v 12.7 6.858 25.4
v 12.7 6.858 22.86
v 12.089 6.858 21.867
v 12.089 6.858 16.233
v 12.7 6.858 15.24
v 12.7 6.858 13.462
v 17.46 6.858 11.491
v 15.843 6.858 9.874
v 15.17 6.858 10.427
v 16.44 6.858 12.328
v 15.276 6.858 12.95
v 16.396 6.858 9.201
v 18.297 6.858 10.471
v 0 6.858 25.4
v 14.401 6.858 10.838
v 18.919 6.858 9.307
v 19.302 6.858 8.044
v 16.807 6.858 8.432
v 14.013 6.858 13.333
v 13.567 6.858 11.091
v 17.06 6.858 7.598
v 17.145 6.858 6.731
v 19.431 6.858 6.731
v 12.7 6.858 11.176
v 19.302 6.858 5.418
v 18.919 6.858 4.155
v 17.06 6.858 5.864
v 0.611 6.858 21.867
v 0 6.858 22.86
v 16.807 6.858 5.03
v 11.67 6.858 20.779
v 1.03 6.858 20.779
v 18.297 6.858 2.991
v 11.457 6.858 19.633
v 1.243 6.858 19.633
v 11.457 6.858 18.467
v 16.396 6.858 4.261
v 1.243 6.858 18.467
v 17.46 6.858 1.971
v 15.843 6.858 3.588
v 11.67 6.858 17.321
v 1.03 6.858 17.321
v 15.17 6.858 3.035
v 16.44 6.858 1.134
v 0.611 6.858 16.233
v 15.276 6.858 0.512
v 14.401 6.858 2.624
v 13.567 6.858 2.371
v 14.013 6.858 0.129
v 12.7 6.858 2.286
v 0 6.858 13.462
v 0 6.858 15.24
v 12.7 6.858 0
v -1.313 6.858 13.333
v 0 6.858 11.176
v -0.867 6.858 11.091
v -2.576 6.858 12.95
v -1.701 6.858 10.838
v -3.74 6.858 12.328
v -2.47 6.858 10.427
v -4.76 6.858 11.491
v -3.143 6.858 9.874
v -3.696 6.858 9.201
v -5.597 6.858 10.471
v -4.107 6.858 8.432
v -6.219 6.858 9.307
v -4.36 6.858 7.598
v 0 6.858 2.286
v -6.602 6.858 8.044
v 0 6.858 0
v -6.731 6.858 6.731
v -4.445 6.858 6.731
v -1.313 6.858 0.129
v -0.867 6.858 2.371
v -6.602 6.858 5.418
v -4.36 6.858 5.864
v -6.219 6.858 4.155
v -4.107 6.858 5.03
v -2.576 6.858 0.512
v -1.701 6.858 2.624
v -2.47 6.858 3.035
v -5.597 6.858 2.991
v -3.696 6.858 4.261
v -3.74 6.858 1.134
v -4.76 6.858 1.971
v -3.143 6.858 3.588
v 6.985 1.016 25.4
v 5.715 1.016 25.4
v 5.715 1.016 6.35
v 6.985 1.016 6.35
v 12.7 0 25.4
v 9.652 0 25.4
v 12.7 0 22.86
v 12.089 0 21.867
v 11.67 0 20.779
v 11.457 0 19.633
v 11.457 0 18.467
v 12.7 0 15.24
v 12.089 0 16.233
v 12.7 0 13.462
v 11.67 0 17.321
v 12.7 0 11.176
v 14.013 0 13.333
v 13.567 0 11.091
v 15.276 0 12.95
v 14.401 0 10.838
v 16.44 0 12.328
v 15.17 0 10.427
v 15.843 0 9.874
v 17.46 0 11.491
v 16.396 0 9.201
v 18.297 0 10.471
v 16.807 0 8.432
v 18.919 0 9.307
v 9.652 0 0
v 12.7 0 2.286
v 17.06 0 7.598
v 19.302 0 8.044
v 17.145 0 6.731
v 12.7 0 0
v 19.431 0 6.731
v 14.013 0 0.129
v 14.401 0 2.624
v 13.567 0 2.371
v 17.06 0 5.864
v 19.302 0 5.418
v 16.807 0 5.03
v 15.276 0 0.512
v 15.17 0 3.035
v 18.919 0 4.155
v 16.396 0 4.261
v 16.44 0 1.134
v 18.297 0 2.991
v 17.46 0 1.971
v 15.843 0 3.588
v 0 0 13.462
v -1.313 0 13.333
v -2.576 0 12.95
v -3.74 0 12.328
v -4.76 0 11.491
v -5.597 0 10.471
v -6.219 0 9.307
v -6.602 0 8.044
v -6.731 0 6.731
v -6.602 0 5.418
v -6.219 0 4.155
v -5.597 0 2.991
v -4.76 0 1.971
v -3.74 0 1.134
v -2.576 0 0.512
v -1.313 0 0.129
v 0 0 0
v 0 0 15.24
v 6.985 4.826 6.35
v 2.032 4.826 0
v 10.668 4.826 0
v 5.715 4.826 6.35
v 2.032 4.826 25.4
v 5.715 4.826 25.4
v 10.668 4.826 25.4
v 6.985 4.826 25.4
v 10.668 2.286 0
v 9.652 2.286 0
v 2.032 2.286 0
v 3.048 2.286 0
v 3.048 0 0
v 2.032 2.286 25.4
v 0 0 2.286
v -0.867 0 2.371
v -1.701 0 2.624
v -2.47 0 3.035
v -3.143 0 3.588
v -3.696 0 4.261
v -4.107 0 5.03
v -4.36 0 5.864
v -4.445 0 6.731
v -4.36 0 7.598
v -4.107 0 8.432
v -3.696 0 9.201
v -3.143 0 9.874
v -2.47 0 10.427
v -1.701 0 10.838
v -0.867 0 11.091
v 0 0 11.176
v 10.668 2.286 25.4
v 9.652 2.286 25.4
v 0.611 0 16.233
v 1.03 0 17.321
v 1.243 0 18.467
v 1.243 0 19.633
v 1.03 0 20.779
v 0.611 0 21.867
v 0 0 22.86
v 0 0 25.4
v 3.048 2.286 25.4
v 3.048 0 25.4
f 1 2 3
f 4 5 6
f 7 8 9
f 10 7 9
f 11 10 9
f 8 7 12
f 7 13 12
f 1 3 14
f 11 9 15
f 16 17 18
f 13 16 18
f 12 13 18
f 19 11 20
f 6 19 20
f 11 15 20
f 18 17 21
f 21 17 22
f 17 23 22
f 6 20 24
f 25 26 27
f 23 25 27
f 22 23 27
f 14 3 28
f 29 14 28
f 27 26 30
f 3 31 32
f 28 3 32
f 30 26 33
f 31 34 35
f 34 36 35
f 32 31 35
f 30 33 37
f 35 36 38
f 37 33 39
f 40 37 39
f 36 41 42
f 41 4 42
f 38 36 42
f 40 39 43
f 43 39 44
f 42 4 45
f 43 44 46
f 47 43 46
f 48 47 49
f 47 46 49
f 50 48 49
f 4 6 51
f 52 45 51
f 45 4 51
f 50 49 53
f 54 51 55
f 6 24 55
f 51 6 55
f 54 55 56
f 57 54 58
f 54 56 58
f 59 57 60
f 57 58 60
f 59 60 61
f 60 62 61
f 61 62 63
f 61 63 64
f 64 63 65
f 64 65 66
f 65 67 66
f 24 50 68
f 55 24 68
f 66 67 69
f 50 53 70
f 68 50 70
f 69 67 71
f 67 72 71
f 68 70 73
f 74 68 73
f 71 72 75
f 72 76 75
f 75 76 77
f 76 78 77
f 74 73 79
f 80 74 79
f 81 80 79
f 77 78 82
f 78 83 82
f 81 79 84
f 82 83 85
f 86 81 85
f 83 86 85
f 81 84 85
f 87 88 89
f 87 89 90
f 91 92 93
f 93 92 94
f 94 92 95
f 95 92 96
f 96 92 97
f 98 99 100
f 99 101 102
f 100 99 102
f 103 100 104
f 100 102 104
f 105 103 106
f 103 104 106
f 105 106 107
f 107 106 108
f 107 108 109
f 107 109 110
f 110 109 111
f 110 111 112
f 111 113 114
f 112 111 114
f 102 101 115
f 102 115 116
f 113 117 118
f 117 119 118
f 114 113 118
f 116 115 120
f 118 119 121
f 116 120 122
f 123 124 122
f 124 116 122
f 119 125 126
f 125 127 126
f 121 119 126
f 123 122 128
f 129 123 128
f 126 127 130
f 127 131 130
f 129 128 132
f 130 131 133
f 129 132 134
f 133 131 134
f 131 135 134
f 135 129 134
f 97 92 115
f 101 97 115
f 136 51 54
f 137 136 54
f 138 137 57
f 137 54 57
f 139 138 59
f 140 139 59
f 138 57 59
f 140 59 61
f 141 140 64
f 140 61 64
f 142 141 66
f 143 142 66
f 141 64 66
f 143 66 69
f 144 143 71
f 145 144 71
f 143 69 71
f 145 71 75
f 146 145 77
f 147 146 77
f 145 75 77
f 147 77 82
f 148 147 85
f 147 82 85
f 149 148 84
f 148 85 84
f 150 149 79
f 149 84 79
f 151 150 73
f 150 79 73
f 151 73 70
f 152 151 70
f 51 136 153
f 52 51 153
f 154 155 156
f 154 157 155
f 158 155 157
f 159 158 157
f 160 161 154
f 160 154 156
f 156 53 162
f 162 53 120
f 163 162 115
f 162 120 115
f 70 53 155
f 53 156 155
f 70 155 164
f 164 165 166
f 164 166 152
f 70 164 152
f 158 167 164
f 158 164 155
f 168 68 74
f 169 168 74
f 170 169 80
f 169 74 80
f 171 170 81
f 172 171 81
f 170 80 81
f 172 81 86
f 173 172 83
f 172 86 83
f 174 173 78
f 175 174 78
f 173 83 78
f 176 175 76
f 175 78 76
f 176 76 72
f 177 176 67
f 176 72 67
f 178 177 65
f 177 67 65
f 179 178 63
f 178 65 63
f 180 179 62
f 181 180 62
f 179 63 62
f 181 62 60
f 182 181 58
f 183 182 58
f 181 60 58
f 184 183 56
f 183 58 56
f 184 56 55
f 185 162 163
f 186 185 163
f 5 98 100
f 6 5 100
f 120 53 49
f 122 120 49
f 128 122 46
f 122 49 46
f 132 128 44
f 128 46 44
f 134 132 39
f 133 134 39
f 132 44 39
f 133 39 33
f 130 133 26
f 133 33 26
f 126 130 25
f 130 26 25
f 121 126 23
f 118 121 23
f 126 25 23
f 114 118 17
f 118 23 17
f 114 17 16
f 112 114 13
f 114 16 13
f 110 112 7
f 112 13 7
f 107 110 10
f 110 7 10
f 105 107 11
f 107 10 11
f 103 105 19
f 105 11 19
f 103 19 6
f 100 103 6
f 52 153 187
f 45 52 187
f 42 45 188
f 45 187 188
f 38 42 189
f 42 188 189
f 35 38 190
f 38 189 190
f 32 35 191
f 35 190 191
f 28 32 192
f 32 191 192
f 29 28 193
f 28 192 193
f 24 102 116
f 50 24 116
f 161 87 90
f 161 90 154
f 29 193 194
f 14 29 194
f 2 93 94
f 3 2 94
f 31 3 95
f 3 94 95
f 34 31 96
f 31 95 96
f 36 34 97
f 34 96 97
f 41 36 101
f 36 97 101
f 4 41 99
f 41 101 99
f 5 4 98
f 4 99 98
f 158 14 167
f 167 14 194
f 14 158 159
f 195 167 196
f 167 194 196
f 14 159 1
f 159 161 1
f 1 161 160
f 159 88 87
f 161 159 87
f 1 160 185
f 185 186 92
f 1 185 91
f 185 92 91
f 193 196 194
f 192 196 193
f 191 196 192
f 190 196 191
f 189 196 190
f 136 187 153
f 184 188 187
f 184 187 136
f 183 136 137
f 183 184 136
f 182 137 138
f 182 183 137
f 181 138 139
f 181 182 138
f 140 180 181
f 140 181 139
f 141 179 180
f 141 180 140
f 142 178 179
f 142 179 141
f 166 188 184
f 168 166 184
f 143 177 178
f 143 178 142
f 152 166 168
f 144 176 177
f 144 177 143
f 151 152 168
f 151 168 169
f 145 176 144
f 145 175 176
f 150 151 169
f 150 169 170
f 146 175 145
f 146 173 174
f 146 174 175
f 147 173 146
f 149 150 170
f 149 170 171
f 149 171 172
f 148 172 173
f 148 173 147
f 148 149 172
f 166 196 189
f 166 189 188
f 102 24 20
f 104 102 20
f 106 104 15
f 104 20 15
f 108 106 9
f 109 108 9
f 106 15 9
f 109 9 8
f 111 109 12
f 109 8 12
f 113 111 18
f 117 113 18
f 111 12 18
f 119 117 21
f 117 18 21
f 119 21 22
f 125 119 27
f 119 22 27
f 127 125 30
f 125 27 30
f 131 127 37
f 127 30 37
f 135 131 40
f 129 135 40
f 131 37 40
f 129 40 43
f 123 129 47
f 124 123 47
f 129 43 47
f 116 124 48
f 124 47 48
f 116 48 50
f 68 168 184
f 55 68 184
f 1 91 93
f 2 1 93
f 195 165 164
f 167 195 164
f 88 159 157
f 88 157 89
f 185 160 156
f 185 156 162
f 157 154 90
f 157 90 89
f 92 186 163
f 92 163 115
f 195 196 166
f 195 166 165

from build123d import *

# Parameters (mm, degrees)
BOSS_EXTRUDE1_DEPTH = 6.858
CUT_EXTRUDE1_DEPTH  = 26.4
BOSS_EXTRUDE2_DEPTH = 6.858
SKETCH6_W           = 1.27
SKETCH6_H           = 3.81
CUT_EXTRUDE2_DEPTH  = 6.35


with BuildPart() as part:
    # Sketch1 → Boss-Extrude1 (new body)
    with BuildSketch(Plane(origin=(0, 0, 0), x_dir=(1, 0, 0), z_dir=(0, 1, 0))):
        with BuildLine():
            Line((0, -22.86), (0, -25.4))
            Line((0, -25.4), (12.7, -25.4))
            Line((12.7, -25.4), (12.7, -22.86))
            ThreePointArc((12.7, -22.86), (11.43, -19.05), (12.7, -15.24))
            Line((12.7, -15.24), (12.7, 0))
            Line((12.7, 0), (0, 0))
            Line((0, 0), (0, -15.24))
            ThreePointArc((0, -15.24), (1.27, -19.05), (0, -22.86))
        make_face()
    extrude(amount=BOSS_EXTRUDE1_DEPTH)

    # Sketch2 → Cut-Extrude1 (cut, through all)
    with BuildSketch(Plane.XY.offset(25.4)):
        Polygon((3.048, 0), (3.048, 2.286), (2.032, 2.286), (2.032, 4.826), (5.715, 4.826), (5.715, 1.016), (6.985, 1.016), (6.985, 4.826), (10.668, 4.826), (10.668, 2.286), (9.652, 2.286), (9.652, 0), align=None)
    extrude(amount=-CUT_EXTRUDE1_DEPTH, mode=Mode.SUBTRACT)

    # Sketch5 → Boss-Extrude2 (add, through all)
    with BuildSketch(Plane(origin=(0, 6.858, 0), x_dir=(1, 0, 0), z_dir=(0, 1, 0))):
        with BuildLine():
            Line((0, 0), (0, -2.286))
            ThreePointArc((0, -2.286), (-4.445, -6.731), (0, -11.176))
            Line((0, -11.176), (0, -13.462))
            ThreePointArc((0, -13.462), (-6.731, -6.731), (0, 0))
        make_face()
        with BuildLine():
            Line((12.7, -13.462), (12.7, -11.176))
            ThreePointArc((12.7, -11.176), (17.145, -6.731), (12.7, -2.286))
            Line((12.7, -2.286), (12.7, 0))
            ThreePointArc((12.7, 0), (19.431, -6.731), (12.7, -13.462))
        make_face()
    extrude(amount=-BOSS_EXTRUDE2_DEPTH)

    # Sketch6 → Cut-Extrude2 (cut)
    with BuildSketch(Plane(origin=(0, 0, 0), x_dir=(-1, 0, 0), z_dir=(0, 0, -1))):
        with Locations((-6.35, 2.921)):
            Rectangle(SKETCH6_W, SKETCH6_H)
    extrude(amount=-CUT_EXTRUDE2_DEPTH, mode=Mode.SUBTRACT)


solid = part.part
